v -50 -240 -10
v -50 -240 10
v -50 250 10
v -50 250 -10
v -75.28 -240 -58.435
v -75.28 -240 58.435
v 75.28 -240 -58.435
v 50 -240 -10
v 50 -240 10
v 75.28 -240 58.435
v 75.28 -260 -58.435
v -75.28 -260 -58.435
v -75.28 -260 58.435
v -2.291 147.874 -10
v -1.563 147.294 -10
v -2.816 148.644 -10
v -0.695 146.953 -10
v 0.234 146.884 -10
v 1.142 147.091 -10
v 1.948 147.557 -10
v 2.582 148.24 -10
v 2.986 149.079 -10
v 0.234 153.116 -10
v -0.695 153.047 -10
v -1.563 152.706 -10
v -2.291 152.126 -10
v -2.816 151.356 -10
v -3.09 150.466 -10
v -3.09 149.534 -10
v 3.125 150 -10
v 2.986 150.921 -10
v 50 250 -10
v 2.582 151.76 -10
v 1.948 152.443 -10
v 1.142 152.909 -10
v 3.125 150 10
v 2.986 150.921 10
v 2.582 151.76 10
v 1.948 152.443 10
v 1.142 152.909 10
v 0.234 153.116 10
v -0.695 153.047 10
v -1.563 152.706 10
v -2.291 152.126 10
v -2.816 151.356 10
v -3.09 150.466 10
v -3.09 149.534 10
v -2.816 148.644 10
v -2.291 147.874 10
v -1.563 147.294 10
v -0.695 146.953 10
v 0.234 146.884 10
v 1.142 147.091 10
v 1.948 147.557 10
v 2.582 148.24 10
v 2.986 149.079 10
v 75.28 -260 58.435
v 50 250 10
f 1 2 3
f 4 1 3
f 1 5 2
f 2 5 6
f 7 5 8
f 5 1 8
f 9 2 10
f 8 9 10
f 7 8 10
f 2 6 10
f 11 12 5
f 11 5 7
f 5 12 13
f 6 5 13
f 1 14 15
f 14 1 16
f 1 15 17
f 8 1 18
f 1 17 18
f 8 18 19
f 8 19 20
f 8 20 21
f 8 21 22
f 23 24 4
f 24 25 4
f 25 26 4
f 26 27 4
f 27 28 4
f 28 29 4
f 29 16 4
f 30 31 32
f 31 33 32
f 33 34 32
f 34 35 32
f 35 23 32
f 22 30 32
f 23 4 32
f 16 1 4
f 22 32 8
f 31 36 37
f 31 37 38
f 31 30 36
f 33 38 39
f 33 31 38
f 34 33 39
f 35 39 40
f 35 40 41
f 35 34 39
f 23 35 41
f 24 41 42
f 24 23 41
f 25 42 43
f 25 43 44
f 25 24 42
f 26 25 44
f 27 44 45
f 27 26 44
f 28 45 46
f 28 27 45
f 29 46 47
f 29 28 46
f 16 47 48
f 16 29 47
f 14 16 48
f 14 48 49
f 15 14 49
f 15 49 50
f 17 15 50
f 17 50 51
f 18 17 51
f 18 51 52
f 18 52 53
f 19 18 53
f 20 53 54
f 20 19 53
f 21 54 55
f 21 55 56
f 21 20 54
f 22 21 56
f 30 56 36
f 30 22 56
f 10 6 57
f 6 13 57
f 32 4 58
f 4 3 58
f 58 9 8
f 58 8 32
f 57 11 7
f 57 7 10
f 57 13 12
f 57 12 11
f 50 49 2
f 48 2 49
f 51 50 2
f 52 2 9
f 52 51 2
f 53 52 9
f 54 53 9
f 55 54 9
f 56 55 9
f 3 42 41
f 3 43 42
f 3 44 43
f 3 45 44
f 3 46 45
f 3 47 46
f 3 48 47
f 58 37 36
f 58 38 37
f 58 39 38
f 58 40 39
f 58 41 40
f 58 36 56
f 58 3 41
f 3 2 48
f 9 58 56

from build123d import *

# Parameters (mm, degrees)
CROQUIS1_W              = 100
CROQUIS1_H              = 500
CROQUIS1_R              = 3.125
SALIENTE_EXTRUIR1_DEPTH = 10
CROQUIS2_W              = 150.55959244
CROQUIS2_H              = 116.869560182
SALIENTE_EXTRUIR2_DEPTH = 10


with BuildPart() as part:
    # Croquis1 → Saliente-Extruir1 (new body, symmetric)
    with BuildSketch(Plane.XY):
        Rectangle(CROQUIS1_W, CROQUIS1_H)
        with Locations((0, 150)):
            Circle(CROQUIS1_R, mode=Mode.SUBTRACT)
    extrude(amount=SALIENTE_EXTRUIR1_DEPTH, both=True)

    # Croquis2 → Saliente-Extruir2 (add, symmetric)
    with BuildSketch(Plane.XZ.offset(250)):
        Rectangle(CROQUIS2_W, CROQUIS2_H)
    extrude(amount=SALIENTE_EXTRUIR2_DEPTH, both=True)


solid = part.part
